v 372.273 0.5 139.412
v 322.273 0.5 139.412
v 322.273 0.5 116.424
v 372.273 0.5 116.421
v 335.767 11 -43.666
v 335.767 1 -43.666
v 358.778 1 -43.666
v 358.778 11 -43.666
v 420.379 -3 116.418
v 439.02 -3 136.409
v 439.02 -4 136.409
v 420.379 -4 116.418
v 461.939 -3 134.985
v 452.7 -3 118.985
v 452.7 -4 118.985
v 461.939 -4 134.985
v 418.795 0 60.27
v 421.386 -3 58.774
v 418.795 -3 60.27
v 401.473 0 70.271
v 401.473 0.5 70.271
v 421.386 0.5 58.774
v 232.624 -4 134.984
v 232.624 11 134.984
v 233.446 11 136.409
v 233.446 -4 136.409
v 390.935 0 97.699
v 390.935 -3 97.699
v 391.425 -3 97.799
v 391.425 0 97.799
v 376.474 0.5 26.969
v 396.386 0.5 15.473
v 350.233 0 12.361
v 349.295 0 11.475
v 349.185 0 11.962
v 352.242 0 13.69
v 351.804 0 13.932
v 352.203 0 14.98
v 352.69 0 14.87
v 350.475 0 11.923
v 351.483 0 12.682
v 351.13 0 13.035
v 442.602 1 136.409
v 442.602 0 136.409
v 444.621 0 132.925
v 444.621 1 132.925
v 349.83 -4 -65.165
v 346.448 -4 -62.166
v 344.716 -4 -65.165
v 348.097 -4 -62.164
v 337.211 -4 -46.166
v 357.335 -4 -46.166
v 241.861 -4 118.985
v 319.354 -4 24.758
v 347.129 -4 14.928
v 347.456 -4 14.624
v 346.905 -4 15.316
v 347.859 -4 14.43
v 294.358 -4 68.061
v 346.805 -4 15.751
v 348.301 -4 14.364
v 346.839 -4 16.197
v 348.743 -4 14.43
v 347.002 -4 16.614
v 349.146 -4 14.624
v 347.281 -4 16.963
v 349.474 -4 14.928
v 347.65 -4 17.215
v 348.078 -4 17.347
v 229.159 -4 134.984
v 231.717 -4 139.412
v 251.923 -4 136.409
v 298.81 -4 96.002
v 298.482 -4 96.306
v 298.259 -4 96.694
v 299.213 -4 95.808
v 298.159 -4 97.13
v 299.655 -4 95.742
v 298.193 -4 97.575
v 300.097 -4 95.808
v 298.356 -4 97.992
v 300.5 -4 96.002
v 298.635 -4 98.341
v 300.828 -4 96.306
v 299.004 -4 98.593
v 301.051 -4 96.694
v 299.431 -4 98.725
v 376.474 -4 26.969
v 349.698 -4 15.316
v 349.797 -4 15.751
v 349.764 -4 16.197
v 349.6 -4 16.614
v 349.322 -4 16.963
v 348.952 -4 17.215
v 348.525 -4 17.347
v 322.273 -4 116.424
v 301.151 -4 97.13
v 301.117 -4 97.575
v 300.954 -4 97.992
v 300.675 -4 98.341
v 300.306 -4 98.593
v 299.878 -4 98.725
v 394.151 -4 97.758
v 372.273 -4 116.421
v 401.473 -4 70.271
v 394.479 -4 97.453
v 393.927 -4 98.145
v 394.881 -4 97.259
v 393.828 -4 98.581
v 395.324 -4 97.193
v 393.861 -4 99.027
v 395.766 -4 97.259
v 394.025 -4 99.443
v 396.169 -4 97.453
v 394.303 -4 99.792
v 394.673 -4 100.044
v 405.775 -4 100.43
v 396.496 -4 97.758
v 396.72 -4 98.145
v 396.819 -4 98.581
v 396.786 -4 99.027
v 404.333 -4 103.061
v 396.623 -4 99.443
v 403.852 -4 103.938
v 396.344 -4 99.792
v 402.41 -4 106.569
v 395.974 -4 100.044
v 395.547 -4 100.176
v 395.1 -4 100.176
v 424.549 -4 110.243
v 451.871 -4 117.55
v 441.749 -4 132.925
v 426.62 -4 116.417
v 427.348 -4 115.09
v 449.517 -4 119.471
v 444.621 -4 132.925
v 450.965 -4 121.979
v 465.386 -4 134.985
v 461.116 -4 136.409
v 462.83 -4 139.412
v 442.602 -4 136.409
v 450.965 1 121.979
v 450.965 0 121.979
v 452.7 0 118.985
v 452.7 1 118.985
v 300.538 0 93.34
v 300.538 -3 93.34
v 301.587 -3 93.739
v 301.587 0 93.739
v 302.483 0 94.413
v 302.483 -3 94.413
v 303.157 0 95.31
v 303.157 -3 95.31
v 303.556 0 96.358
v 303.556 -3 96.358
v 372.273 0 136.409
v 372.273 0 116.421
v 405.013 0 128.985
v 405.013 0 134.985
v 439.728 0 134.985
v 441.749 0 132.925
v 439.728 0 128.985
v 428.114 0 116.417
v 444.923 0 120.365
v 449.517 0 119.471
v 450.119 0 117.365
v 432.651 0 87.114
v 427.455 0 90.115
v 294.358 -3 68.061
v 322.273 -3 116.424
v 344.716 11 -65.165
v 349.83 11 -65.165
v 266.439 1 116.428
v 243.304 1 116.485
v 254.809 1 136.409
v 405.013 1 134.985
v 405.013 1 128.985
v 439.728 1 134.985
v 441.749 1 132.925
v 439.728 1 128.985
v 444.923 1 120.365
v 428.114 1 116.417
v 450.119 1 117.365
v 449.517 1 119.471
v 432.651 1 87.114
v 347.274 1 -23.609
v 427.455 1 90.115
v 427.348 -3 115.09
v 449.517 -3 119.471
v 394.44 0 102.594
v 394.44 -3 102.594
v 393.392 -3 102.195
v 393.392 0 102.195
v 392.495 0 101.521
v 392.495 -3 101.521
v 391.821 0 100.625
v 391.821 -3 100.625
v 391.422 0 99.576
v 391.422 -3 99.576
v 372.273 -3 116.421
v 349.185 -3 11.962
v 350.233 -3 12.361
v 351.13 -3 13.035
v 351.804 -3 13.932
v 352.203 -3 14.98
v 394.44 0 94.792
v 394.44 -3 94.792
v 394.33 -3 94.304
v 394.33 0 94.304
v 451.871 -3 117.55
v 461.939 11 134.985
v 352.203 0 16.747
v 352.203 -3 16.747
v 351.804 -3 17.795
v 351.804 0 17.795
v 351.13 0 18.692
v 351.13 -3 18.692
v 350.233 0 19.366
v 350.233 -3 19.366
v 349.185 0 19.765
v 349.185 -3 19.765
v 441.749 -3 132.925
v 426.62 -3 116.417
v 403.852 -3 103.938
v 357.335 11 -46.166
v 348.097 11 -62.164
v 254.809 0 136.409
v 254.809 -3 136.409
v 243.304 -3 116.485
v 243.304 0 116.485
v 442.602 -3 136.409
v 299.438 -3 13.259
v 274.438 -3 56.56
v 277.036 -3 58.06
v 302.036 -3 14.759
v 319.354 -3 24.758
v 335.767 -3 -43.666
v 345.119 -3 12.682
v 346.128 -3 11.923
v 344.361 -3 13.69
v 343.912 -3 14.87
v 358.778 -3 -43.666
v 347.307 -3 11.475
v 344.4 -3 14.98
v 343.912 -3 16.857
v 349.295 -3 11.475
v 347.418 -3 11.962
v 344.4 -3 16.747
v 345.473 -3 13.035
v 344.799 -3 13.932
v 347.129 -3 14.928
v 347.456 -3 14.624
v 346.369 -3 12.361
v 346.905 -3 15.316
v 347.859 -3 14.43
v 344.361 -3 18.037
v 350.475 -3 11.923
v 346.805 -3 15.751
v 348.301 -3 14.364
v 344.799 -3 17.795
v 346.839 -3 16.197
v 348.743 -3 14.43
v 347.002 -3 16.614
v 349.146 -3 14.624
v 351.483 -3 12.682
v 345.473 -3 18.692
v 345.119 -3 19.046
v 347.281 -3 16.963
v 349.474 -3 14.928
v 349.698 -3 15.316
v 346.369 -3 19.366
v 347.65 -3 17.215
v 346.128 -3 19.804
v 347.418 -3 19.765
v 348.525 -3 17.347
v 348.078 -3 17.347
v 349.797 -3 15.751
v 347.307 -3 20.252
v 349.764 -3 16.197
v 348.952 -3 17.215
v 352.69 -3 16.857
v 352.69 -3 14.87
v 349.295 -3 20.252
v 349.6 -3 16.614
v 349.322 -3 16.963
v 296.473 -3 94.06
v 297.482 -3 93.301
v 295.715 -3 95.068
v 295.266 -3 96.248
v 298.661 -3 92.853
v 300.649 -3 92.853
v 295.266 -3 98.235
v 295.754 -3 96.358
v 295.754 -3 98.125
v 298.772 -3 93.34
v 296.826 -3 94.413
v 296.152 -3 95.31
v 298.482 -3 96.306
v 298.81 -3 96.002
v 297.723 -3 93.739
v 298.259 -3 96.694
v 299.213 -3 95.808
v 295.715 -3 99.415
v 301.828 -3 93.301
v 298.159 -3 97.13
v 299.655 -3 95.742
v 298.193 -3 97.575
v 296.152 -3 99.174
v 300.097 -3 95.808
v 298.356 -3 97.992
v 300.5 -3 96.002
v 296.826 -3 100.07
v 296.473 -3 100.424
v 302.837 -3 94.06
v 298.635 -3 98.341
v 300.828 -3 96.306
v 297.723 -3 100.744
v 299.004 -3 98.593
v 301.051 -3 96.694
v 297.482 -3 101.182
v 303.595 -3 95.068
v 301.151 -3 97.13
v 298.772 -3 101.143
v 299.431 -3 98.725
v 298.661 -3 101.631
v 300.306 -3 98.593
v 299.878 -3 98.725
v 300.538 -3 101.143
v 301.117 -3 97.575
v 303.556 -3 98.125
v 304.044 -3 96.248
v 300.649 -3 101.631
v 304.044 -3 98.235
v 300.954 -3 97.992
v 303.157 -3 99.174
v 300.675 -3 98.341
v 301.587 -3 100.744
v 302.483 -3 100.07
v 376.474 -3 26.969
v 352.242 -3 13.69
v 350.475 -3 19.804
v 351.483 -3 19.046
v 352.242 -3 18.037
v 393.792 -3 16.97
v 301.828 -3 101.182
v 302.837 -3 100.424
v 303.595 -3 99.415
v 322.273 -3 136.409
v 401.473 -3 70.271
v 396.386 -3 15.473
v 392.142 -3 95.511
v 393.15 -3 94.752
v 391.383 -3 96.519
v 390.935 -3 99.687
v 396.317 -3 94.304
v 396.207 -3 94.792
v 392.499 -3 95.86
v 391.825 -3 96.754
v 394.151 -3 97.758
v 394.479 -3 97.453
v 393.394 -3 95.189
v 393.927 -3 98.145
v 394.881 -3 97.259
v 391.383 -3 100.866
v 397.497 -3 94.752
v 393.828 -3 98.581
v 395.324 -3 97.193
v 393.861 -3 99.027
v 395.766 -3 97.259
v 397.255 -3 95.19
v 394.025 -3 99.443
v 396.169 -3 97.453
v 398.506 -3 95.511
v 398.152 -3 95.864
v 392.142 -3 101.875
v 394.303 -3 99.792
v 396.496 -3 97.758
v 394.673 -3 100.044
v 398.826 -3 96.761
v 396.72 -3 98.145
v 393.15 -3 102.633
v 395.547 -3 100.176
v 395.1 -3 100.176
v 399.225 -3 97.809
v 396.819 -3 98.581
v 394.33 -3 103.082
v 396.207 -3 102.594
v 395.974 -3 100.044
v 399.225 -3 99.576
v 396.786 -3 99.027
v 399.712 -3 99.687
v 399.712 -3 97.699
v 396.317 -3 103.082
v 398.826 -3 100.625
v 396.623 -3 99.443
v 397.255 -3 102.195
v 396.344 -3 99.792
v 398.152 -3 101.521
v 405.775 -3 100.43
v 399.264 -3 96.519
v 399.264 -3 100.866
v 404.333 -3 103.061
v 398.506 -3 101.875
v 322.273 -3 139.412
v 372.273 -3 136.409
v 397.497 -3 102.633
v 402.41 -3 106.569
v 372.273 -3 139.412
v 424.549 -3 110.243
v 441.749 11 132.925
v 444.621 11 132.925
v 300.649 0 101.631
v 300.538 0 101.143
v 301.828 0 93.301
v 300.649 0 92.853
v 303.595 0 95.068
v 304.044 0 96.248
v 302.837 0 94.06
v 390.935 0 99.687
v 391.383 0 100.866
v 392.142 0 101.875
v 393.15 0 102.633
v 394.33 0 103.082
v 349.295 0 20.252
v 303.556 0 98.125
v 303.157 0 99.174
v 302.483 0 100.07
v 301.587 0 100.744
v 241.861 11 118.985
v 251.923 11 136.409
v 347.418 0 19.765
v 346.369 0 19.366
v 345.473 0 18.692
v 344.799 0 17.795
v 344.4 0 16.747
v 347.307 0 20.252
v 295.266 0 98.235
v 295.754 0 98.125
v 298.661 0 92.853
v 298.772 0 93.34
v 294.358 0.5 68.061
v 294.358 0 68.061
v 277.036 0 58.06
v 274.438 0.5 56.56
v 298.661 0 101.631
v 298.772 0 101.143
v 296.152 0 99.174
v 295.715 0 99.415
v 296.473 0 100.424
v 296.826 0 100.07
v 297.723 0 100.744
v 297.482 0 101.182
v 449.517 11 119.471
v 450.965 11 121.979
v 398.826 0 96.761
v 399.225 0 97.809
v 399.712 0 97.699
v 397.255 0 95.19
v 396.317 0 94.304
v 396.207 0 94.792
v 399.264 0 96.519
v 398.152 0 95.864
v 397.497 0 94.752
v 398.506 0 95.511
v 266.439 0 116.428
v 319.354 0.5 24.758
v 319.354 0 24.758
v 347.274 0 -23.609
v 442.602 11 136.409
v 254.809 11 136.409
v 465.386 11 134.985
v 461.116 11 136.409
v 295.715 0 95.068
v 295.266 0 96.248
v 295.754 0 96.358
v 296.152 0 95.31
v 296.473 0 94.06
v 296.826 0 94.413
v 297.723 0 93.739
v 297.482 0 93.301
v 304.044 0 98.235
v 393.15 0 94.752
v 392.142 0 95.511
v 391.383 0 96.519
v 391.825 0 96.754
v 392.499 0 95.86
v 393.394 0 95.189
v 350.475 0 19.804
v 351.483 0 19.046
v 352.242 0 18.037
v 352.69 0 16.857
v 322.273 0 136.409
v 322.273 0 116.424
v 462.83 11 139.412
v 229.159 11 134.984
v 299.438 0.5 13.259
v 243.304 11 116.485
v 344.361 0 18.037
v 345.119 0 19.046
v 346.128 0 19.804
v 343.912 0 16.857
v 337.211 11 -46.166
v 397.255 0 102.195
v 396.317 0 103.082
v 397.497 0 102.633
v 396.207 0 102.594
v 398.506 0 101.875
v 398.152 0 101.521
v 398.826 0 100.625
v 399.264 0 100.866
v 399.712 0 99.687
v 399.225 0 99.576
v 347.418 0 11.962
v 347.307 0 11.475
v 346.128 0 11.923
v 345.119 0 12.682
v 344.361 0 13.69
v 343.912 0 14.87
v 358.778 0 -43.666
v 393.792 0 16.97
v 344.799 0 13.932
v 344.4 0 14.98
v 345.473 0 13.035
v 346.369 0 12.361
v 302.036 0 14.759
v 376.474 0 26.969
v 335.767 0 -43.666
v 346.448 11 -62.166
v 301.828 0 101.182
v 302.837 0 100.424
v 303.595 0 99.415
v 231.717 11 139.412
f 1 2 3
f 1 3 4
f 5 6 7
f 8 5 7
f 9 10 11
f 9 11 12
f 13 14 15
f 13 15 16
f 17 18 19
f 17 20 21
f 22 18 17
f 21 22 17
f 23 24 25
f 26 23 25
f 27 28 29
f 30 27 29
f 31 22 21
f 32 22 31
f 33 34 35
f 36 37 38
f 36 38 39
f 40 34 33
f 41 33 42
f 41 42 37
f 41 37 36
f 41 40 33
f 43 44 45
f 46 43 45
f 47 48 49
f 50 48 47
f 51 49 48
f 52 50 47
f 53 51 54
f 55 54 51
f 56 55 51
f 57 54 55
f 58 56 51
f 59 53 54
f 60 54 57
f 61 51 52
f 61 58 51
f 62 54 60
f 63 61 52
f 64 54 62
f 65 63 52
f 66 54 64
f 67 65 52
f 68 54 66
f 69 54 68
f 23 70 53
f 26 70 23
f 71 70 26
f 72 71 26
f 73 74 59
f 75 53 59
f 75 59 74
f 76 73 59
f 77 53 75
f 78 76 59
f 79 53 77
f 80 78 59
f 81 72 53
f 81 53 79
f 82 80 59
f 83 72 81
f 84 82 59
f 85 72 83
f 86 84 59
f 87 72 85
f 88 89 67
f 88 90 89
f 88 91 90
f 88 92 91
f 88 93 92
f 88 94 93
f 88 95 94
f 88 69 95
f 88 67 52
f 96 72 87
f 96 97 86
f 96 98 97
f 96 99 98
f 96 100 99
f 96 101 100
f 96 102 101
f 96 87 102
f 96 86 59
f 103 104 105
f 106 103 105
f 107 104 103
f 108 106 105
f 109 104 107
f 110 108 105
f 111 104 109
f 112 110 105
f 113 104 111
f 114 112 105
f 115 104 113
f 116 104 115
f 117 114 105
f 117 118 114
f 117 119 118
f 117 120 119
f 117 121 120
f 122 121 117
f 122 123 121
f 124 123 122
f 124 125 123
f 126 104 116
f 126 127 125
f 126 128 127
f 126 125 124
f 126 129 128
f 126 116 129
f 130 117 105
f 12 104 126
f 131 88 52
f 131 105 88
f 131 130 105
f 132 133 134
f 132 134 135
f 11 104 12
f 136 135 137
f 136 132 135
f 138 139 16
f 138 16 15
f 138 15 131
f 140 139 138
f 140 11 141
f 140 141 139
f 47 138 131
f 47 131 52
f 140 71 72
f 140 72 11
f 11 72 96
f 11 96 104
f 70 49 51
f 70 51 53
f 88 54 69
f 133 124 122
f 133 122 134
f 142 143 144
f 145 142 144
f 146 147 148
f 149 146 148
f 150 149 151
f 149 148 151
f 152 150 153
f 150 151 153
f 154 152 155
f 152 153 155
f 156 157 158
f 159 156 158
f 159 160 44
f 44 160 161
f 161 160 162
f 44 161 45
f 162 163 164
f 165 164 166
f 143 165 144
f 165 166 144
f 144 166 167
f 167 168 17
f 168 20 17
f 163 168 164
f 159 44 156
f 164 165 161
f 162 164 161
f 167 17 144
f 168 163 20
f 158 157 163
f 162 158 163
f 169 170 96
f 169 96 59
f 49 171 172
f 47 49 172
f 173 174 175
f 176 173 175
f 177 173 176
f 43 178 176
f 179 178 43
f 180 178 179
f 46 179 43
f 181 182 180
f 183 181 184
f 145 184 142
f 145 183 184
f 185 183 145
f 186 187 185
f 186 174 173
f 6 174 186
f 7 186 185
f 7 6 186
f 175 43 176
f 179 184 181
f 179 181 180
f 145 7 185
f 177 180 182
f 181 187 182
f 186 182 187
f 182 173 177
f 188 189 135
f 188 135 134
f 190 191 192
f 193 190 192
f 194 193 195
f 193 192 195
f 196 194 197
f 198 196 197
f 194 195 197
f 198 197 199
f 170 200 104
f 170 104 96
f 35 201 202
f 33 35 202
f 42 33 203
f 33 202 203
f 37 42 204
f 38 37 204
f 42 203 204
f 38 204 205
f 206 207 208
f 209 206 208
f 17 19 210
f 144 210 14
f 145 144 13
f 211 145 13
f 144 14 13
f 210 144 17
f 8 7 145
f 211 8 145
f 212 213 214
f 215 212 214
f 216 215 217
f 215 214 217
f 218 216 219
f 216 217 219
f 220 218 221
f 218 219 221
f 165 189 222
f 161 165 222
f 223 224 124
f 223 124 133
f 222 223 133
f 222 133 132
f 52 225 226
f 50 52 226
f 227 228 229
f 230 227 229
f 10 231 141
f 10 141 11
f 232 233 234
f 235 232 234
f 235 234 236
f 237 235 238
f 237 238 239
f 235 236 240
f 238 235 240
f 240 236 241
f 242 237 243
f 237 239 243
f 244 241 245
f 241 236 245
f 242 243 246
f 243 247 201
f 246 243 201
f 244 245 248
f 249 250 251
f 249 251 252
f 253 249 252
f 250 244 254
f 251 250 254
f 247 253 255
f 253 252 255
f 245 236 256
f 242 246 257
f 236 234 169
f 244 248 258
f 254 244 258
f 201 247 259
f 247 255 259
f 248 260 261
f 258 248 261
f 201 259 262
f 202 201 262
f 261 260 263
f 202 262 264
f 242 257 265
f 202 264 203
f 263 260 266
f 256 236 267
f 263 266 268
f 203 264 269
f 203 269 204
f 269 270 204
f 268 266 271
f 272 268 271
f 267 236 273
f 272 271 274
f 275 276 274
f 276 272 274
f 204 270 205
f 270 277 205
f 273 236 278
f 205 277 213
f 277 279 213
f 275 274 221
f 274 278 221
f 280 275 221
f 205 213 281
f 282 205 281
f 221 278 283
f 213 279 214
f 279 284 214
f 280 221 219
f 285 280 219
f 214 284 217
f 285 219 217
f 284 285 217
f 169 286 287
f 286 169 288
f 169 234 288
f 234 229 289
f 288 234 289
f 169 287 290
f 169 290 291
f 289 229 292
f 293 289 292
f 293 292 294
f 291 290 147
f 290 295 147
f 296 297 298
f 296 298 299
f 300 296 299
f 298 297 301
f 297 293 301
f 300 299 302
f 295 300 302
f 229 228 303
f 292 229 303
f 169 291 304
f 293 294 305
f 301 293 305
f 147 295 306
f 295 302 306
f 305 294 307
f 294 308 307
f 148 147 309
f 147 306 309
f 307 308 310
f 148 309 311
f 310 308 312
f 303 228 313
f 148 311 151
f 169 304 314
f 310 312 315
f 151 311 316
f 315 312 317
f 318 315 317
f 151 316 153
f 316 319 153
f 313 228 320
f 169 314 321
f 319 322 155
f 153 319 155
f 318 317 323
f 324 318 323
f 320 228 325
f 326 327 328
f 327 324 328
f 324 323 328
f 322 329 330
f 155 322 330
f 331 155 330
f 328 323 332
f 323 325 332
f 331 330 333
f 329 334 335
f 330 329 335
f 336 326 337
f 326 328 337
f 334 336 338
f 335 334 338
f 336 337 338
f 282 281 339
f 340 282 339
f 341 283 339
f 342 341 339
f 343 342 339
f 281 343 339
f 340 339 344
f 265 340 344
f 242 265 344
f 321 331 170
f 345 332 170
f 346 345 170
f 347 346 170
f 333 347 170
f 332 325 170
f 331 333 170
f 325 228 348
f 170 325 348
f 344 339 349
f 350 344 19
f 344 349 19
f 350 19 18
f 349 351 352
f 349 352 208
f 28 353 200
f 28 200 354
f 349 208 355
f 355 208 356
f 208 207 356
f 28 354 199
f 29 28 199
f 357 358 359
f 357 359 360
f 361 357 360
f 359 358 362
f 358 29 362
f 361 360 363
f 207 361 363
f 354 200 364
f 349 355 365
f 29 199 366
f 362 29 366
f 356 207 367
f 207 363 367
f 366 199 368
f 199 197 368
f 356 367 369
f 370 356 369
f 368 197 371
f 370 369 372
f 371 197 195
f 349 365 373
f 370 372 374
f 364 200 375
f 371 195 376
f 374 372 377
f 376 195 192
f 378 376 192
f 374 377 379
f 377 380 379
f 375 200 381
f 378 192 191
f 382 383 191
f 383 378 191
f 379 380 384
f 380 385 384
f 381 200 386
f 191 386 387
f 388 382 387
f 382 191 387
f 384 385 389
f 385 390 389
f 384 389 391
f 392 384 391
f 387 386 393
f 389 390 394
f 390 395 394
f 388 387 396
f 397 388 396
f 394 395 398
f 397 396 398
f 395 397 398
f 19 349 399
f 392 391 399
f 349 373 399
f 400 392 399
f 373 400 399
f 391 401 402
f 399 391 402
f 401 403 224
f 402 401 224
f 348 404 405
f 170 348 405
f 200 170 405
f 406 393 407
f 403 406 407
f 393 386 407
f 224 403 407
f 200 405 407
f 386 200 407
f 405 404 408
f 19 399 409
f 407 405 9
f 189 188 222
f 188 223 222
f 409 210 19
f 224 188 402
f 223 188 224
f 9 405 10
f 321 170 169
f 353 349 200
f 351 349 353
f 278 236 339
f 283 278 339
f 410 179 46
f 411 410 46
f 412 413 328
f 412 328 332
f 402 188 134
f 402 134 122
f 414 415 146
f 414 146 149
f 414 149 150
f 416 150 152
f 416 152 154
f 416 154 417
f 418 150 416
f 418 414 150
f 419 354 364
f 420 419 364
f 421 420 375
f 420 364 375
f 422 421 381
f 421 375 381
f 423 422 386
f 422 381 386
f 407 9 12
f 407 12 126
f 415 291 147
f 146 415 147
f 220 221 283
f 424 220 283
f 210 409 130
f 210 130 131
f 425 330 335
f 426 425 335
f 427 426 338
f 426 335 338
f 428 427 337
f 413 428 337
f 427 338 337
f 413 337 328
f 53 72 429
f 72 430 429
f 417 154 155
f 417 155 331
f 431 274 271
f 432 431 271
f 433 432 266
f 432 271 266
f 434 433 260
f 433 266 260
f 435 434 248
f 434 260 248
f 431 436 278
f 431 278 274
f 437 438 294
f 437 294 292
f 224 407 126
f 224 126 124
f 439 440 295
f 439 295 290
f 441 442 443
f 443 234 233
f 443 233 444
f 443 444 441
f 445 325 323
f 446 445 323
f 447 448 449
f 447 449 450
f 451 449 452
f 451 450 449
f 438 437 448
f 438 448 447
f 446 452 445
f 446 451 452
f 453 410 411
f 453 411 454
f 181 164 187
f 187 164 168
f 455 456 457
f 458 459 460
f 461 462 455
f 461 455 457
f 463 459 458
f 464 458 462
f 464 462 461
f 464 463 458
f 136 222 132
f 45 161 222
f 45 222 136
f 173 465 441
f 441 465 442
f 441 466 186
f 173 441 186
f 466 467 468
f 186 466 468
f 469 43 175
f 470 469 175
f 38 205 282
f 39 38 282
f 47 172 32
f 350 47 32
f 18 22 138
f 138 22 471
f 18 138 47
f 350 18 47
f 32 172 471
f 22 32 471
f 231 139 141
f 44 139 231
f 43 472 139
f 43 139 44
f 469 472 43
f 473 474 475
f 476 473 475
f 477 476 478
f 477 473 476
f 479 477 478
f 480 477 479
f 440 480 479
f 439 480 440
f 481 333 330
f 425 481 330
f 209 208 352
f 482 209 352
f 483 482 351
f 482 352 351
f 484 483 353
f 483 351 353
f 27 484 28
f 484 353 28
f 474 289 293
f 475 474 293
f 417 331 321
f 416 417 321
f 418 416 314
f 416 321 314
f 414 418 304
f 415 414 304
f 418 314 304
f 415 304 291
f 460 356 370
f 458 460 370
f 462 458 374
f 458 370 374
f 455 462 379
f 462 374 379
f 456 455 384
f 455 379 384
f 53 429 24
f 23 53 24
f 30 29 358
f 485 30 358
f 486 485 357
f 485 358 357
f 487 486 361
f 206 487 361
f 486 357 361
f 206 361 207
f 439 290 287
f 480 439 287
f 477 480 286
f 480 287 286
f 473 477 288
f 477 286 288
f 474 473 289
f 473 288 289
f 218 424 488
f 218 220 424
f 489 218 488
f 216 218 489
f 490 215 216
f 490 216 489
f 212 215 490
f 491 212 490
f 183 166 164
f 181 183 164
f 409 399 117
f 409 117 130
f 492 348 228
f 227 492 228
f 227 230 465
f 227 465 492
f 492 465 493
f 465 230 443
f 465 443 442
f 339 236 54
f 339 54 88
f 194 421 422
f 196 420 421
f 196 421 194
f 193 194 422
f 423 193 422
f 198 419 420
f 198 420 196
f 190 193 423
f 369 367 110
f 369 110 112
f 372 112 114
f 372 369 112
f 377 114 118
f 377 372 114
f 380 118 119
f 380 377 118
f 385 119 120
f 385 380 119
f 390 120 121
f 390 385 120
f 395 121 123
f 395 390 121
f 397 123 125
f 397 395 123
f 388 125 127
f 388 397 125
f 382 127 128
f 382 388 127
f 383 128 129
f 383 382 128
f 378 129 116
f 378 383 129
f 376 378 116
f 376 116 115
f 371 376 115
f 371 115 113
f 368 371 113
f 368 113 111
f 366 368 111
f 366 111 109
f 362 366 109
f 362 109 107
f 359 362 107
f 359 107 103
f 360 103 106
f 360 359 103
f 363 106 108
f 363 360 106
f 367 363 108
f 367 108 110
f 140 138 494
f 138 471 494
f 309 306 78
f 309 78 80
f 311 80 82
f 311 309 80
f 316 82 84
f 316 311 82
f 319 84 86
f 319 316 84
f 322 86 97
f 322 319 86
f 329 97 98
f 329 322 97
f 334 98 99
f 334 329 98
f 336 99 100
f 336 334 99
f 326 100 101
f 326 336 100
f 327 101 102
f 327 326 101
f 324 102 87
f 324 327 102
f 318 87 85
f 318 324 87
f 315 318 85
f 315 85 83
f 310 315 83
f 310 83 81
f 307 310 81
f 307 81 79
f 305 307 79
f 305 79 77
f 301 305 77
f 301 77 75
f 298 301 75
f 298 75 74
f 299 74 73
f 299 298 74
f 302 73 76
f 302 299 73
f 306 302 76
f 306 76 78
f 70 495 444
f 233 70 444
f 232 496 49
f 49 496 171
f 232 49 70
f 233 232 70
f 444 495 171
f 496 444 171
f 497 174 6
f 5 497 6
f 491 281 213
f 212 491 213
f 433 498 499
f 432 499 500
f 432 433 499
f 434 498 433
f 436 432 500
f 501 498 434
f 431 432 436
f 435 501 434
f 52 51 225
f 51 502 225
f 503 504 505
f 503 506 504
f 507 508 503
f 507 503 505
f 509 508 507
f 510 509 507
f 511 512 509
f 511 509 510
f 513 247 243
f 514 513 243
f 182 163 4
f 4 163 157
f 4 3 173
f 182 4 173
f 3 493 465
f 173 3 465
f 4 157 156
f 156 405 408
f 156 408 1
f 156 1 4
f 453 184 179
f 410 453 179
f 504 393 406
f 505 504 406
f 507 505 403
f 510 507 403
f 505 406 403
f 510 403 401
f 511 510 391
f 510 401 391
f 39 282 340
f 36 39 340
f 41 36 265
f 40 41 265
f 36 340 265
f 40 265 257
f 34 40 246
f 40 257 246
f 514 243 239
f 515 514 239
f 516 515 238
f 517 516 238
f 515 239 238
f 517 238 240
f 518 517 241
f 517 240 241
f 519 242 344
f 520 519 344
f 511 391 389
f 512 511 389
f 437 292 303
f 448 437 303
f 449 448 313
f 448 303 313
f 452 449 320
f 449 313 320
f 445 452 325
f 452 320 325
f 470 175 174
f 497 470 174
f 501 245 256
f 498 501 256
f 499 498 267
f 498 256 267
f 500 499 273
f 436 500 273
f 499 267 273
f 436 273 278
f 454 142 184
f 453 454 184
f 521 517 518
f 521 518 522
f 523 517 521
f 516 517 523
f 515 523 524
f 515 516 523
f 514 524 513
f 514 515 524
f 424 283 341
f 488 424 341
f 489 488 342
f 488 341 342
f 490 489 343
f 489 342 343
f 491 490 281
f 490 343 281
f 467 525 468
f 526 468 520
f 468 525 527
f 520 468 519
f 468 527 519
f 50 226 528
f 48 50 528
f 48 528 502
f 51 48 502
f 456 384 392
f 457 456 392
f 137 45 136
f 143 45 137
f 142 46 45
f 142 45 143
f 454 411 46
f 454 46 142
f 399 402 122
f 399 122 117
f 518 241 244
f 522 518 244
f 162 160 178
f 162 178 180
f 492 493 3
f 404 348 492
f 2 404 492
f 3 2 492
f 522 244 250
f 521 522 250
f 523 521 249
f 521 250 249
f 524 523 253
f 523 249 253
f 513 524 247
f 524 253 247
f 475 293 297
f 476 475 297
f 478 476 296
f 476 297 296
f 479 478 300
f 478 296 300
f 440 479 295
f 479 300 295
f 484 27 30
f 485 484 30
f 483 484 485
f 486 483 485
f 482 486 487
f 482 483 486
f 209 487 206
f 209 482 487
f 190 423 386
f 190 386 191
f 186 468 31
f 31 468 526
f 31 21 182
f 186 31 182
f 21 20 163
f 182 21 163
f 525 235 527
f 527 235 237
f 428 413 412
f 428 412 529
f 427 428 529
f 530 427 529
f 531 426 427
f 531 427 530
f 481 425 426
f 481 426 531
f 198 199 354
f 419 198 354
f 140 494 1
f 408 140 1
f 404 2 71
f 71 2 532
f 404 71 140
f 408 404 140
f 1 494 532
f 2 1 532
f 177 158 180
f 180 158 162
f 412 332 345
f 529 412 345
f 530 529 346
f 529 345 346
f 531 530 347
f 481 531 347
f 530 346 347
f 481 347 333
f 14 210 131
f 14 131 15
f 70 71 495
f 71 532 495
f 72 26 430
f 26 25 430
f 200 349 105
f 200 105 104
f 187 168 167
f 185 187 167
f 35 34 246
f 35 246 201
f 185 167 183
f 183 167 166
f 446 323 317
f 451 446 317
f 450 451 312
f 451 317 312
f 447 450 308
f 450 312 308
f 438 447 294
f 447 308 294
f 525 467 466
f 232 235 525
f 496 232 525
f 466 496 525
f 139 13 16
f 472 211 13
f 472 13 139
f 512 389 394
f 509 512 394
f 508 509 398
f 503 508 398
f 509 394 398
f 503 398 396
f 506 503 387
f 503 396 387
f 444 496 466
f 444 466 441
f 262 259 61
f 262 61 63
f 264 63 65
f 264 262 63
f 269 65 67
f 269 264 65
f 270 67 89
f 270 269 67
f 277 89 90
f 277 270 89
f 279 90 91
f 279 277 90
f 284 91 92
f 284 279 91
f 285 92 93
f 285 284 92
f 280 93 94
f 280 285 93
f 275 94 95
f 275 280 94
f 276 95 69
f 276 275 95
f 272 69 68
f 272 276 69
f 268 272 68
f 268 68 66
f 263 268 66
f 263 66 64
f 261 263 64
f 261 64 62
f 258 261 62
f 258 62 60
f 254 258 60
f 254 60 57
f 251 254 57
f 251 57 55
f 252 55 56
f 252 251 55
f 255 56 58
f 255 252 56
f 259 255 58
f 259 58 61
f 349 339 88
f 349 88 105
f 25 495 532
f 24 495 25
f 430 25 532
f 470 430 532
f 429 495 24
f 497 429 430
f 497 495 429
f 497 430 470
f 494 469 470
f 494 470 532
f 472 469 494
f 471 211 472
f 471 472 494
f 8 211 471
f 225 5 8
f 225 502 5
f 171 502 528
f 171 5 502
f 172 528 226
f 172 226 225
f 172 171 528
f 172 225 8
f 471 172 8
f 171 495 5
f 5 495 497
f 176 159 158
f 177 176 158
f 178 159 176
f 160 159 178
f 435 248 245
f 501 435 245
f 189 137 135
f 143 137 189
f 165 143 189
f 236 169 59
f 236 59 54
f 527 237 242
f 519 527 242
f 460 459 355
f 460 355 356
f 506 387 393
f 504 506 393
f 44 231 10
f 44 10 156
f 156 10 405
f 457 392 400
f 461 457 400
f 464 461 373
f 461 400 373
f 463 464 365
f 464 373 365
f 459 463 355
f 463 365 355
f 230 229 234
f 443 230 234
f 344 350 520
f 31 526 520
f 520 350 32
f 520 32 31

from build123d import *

# Parameters (mm, degrees)
SKETCH1_W                = 34.714871787
SKETCH1_H                = 6
BOSS_EXTRUDE1_DEPTH      = 1
BOSS_EXTRUDE2_DEPTH      = 11
BOSS_EXTRUDE3_DEPTH      = 5
BOSS_EXTRUDE3_DEPTH_BACK = 3
SKETCH3_W                = 50
SKETCH3_H                = 7
CUT_EXTRUDE3_DEPTH       = 25
SKETCH5_W                = 50
SKETCH5_H                = 7
CUT_EXTRUDE4_DEPTH       = 25
SKETCH6_W                = 50
SKETCH6_H                = 7
CUT_EXTRUDE5_DEPTH       = 25
SKETCH8_R                = 1.500000001
SKETCH8_R_2              = 1.499999999
BOSS_EXTRUDE5_DEPTH      = 1
BOSS_EXTRUDE10_DEPTH     = 3


with BuildPart() as part:
    # Sketch1 → Boss-Extrude1 (new body)
    with BuildSketch(Plane(origin=(0, 0, 0), x_dir=(1, 0, 0), z_dir=(0, 1, 0))):
        Polygon((243.304219779, -116.484791863), (254.809280582, -136.408896135), (442.602090749, -136.409305398), (444.621046678, -132.925433226), (441.749040748, -132.925433226), (449.516726723, -119.47140646), (450.9646953, -121.978953126), (452.699916625, -118.984688022), (358.778179038, 43.666038061), (335.767496282, 43.666038061), align=None)
        with Locations((422.370878913, -131.984588005)):
            Rectangle(SKETCH1_W, SKETCH1_H, mode=Mode.SUBTRACT)
        Polygon((450.119365975, -117.364996826), (444.923425166, -120.365363323), (427.455346217, -90.114690822), (432.651287025, -87.114324326), align=None, mode=Mode.SUBTRACT)
        Polygon((428.11367092, -116.417164681), (266.439108269, -116.428009228), (347.27360973, 23.609230811), align=None, mode=Mode.SUBTRACT)
    extrude(amount=BOSS_EXTRUDE1_DEPTH)

    # Sketch1<9> → Boss-Extrude2 (add)
    # profile 1 of 2: a face of its own
    with BuildSketch(Plane(origin=(0, 0, 0), x_dir=(1, 0, 0), z_dir=(0, 1, 0))):
        Polygon((229.15943255, -134.984249185), (231.716666588, -139.412373829), (462.829865412, -139.412373829), (465.38624875, -134.984588004), (349.829542096, 65.165499075), (344.716133219, 65.165499075), align=None)
        Polygon((251.922647993, -136.409305396), (233.446303405, -136.408896135), (232.623553964, -134.984217354), (241.860901693, -118.984688015), align=None, mode=Mode.SUBTRACT)
        Polygon((442.602090749, -136.409305398), (254.809280582, -136.408896135), (243.304219779, -116.484791863), (335.767496282, 43.666038061), (358.778179038, 43.666038061), (461.93896796, -134.98458801), (461.116393748, -136.409305398), align=None, mode=Mode.SUBTRACT)
        Polygon((348.096628302, 62.164013367), (357.334800991, 46.166038067), (337.210874326, 46.166038067), (346.44844193, 62.165948237), align=None, mode=Mode.SUBTRACT)
    # profile 2 of 2: a face of its own
    with BuildSketch(Plane(origin=(0, 0, 0), x_dir=(1, 0, 0), z_dir=(0, 1, 0))):
        Polygon((441.749040748, -132.925433226), (444.621046678, -132.925433226), (450.9646953, -121.978953126), (449.516726723, -119.47140646), align=None)
    extrude(amount=BOSS_EXTRUDE2_DEPTH)

    # Sketch1<10> → Boss-Extrude3 (add, two sides: drawn at the far end of the back side and taken through both)
    # profile 1 of 2: a face of its own
    with BuildSketch(Plane(origin=(0, 0, 0), x_dir=(1, 0, 0), z_dir=(0, 1, 0)).offset(-BOSS_EXTRUDE3_DEPTH_BACK)):
        Polygon((229.15943255, -134.984249185), (231.716666588, -139.412373829), (462.829865412, -139.412373829), (465.38624875, -134.984588004), (349.829542096, 65.165499075), (344.716133219, 65.165499075), align=None)
        Polygon((251.922647993, -136.409305396), (233.446303405, -136.408896135), (232.623553964, -134.984217354), (241.860901693, -118.984688015), align=None, mode=Mode.SUBTRACT)
        Polygon((442.602090749, -136.409305398), (254.809280582, -136.408896135), (243.304219779, -116.484791863), (335.767496282, 43.666038061), (358.778179038, 43.666038061), (461.93896796, -134.98458801), (461.116393748, -136.409305398), align=None, mode=Mode.SUBTRACT)
        Polygon((348.096628302, 62.164013367), (357.334800991, 46.166038067), (337.210874326, 46.166038067), (346.44844193, 62.165948237), align=None, mode=Mode.SUBTRACT)
    # profile 2 of 2: a face of its own
    with BuildSketch(Plane(origin=(0, 0, 0), x_dir=(1, 0, 0), z_dir=(0, 1, 0)).offset(-BOSS_EXTRUDE3_DEPTH_BACK)):
        Polygon((441.749040748, -132.925433226), (444.621046678, -132.925433226), (450.9646953, -121.978953126), (449.516726723, -119.47140646), align=None)
    extrude(amount=BOSS_EXTRUDE3_DEPTH + BOSS_EXTRUDE3_DEPTH_BACK)

    # Sketch3 → Cut-Extrude3 (cut)
    with BuildSketch(Plane(origin=(290.589645397, 0, -167.772009994), x_dir=(-0.49999999999998745, 0, -0.8660254037844459), z_dir=(0.8660254037844459, 0, -0.49999999999998745))):
        with Locations((-236.592990632, -3)):
            Rectangle(SKETCH3_W, SKETCH3_H)
    extrude(amount=-CUT_EXTRUDE3_DEPTH, mode=Mode.SUBTRACT)

    # Sketch5 → Cut-Extrude4 (cut)
    with BuildSketch(Plane.XY.offset(139.412373829)):
        with Locations((347.273266, -3)):
            Rectangle(SKETCH5_W, SKETCH5_H)
    extrude(amount=-CUT_EXTRUDE4_DEPTH, mode=Mode.SUBTRACT)

    # Sketch6 → Cut-Extrude5 (cut)
    with BuildSketch(Plane(origin=(230.319375802, 0, 132.975171836), x_dir=(-0.5000006153901599, 0, 0.8660250484884727), z_dir=(-0.8660250484884727, 0, -0.5000006153901599))):
        with Locations((-113.236674797, -3)):
            Rectangle(SKETCH6_W, SKETCH6_H)
    extrude(amount=-CUT_EXTRUDE5_DEPTH, mode=Mode.SUBTRACT)

    # Sketch8 → Boss-Extrude5 (add)
    with BuildSketch(Plane.XZ.offset(3)):
        Polygon((349.829542096, -65.165499075), (465.38624875, 134.984588004), (462.829865412, 139.412373829), (231.716666588, 139.412373829), (229.15943255, 134.984249185), (344.716133219, -65.165499075), align=None)
        with Locations((395.323540807, 98.692824233)):
            Circle(SKETCH8_R, mode=Mode.SUBTRACT)
        with Locations((348.301285092, 15.86352663)):
            Circle(SKETCH8_R_2, mode=Mode.SUBTRACT)
        with Locations((299.654911442, 97.241681778)):
            Circle(SKETCH8_R, mode=Mode.SUBTRACT)
        Polygon((444.621046678, 132.925433226), (450.9646953, 121.978953126), (449.516726723, 119.47140646), (427.347592194, 115.090208206), (404.332986149, 103.060878104), (405.774939108, 100.430142149), (424.549299543, 110.243170392), (451.871255231, 117.549638152), (452.699916625, 118.984688022), (461.93896796, 134.98458801), (461.116393748, 136.409305398), (442.602090749, 136.409305398), (439.019602541, 136.409297591), (420.379437569, 116.417683466), (402.410382204, 106.568526043), (403.852335163, 103.937790089), (426.620208945, 116.417264858), (441.749040748, 132.925433226), align=None, mode=Mode.SUBTRACT)
        Polygon((322.273266, 116.424264074), (294.35821863, 68.061097963), (319.354499369, 24.757680454), (376.473657314, 26.969372807), (401.472679509, 70.271207532), (372.273266, 116.420910254), align=None, mode=Mode.SUBTRACT)
        Polygon((233.446303405, 136.408896135), (251.922647993, 136.409305396), (241.860901693, 118.984688015), (232.623553964, 134.984217354), align=None, mode=Mode.SUBTRACT)
        Polygon((337.210874326, -46.166038067), (357.334800991, -46.166038067), (348.096628302, -62.164013367), (346.44844193, -62.165948237), align=None, mode=Mode.SUBTRACT)
    extrude(amount=BOSS_EXTRUDE5_DEPTH)

    # Sketch12 → Boss-Extrude10 (add)
    with BuildSketch(Plane(origin=(0, -3, 0), x_dir=(1, 0, 0), z_dir=(0, 1, 0))):
        with BuildLine():
            ThreePointArc((352.690173981, -14.86971864), (351.483265607, -12.681546115), (349.295093082, -11.474637741))
            Line((349.295093082, -11.474637742), (349.184669972, -11.962292063))
            ThreePointArc((349.184669972, -11.962292062), (351.129712217, -13.035099505), (352.20251966, -14.98014175))
            Line((352.20251966, -14.98014175), (352.690173981, -14.86971864))
        make_face()
        with BuildLine():
            Line((347.417900212, -11.962292063), (347.307477102, -11.474637742))
            ThreePointArc((347.307477102, -11.474637741), (345.119304576, -12.681546115), (343.912396203, -14.86971864))
            Line((343.912396203, -14.86971864), (344.400050524, -14.98014175))
            ThreePointArc((344.400050524, -14.98014175), (345.472857967, -13.035099505), (347.417900212, -11.962292062))
        make_face()
        with BuildLine():
            ThreePointArc((349.295093082, -20.25241552), (351.483265607, -19.045507146), (352.690173981, -16.85733462))
            Line((352.690173981, -16.85733462), (352.20251966, -16.74691151))
            ThreePointArc((352.20251966, -16.74691151), (351.129712217, -18.691953755), (349.184669972, -19.764761199))
            Line((349.184669972, -19.764761198), (349.295093082, -20.252415519))
        make_face()
        with BuildLine():
            Line((344.400050524, -16.74691151), (343.912396203, -16.85733462))
            ThreePointArc((343.912396203, -16.85733462), (345.119304576, -19.045507146), (347.307477102, -20.25241552))
            Line((347.307477102, -20.252415519), (347.417900212, -19.764761198))
            ThreePointArc((347.417900212, -19.764761199), (345.472857967, -18.691953755), (344.400050524, -16.74691151))
        make_face()
        with BuildLine():
            Line((394.440155927, -94.791589665), (394.329732817, -94.303935344))
            ThreePointArc((394.329732817, -94.303935343), (392.141560291, -95.510843717), (390.934651917, -97.699016243))
            Line((390.934651918, -97.699016243), (391.424789599, -97.798542944))
            ThreePointArc((391.424789599, -97.798542944), (392.499067688, -95.860448621), (394.440155927, -94.791589664))
        make_face()
        with BuildLine():
            ThreePointArc((399.712429696, -97.699016243), (398.505521322, -95.510843717), (396.317348797, -94.303935343))
            Line((396.317348797, -94.303935344), (396.206925687, -94.791589665))
            ThreePointArc((396.206925687, -94.791589664), (398.151967932, -95.864397108), (399.224775375, -97.809439353))
            Line((399.224775375, -97.809439353), (399.712429695, -97.699016243))
        make_face()
        with BuildLine():
            Line((391.422306239, -99.576209113), (390.934651918, -99.686632223))
            ThreePointArc((390.934651917, -99.686632223), (392.141560291, -101.874804748), (394.329732817, -103.081713122))
            Line((394.329732817, -103.081713121), (394.440155927, -102.5940588))
            ThreePointArc((394.440155927, -102.594058801), (392.495113682, -101.521251358), (391.422306238, -99.576209113))
        make_face()
        with BuildLine():
            ThreePointArc((396.317348797, -103.081713122), (398.505521322, -101.874804748), (399.712429696, -99.686632223))
            Line((399.712429695, -99.686632223), (399.224775375, -99.576209113))
            ThreePointArc((399.224775375, -99.576209113), (398.151967932, -101.521251358), (396.206925687, -102.594058801))
            Line((396.206925687, -102.5940588), (396.317348797, -103.081713121))
        make_face()
        with BuildLine():
            ThreePointArc((298.661103452, -92.85279289), (296.472930928, -94.059701263), (295.266022554, -96.247873788))
            Line((295.266022553, -96.247873788), (295.753676874, -96.358296898))
            ThreePointArc((295.753676875, -96.358296898), (296.826484318, -94.413254654), (298.771526562, -93.340447211))
            Line((298.771526562, -93.34044721), (298.661103452, -92.852792889))
        make_face()
        with BuildLine():
            Line((295.753676874, -98.125066658), (295.266022553, -98.235489768))
            ThreePointArc((295.266022554, -98.235489767), (296.472930928, -100.423662292), (298.661103452, -101.630570665))
            Line((298.661103452, -101.630570666), (298.771526562, -101.142916345))
            ThreePointArc((298.771526562, -101.142916344), (296.826484318, -100.070108901), (295.753676875, -98.125066657))
        make_face()
        with BuildLine():
            ThreePointArc((304.04380033, -96.247873788), (302.836891957, -94.059701263), (300.648719432, -92.85279289))
            Line((300.648719432, -92.852792889), (300.538296322, -93.34044721))
            ThreePointArc((300.538296322, -93.340447211), (302.483338566, -94.413254654), (303.556146009, -96.358296898))
            Line((303.55614601, -96.358296898), (304.043800331, -96.247873788))
        make_face()
        with BuildLine():
            Line((300.538296322, -101.142916345), (300.648719432, -101.630570666))
            ThreePointArc((300.648719432, -101.630570665), (302.836891957, -100.423662292), (304.04380033, -98.235489767))
            Line((304.043800331, -98.235489768), (303.55614601, -98.125066658))
            ThreePointArc((303.556146009, -98.125066657), (302.483338566, -100.070108901), (300.538296322, -101.142916344))
        make_face()
    extrude(amount=BOSS_EXTRUDE10_DEPTH)


solid = part.part
